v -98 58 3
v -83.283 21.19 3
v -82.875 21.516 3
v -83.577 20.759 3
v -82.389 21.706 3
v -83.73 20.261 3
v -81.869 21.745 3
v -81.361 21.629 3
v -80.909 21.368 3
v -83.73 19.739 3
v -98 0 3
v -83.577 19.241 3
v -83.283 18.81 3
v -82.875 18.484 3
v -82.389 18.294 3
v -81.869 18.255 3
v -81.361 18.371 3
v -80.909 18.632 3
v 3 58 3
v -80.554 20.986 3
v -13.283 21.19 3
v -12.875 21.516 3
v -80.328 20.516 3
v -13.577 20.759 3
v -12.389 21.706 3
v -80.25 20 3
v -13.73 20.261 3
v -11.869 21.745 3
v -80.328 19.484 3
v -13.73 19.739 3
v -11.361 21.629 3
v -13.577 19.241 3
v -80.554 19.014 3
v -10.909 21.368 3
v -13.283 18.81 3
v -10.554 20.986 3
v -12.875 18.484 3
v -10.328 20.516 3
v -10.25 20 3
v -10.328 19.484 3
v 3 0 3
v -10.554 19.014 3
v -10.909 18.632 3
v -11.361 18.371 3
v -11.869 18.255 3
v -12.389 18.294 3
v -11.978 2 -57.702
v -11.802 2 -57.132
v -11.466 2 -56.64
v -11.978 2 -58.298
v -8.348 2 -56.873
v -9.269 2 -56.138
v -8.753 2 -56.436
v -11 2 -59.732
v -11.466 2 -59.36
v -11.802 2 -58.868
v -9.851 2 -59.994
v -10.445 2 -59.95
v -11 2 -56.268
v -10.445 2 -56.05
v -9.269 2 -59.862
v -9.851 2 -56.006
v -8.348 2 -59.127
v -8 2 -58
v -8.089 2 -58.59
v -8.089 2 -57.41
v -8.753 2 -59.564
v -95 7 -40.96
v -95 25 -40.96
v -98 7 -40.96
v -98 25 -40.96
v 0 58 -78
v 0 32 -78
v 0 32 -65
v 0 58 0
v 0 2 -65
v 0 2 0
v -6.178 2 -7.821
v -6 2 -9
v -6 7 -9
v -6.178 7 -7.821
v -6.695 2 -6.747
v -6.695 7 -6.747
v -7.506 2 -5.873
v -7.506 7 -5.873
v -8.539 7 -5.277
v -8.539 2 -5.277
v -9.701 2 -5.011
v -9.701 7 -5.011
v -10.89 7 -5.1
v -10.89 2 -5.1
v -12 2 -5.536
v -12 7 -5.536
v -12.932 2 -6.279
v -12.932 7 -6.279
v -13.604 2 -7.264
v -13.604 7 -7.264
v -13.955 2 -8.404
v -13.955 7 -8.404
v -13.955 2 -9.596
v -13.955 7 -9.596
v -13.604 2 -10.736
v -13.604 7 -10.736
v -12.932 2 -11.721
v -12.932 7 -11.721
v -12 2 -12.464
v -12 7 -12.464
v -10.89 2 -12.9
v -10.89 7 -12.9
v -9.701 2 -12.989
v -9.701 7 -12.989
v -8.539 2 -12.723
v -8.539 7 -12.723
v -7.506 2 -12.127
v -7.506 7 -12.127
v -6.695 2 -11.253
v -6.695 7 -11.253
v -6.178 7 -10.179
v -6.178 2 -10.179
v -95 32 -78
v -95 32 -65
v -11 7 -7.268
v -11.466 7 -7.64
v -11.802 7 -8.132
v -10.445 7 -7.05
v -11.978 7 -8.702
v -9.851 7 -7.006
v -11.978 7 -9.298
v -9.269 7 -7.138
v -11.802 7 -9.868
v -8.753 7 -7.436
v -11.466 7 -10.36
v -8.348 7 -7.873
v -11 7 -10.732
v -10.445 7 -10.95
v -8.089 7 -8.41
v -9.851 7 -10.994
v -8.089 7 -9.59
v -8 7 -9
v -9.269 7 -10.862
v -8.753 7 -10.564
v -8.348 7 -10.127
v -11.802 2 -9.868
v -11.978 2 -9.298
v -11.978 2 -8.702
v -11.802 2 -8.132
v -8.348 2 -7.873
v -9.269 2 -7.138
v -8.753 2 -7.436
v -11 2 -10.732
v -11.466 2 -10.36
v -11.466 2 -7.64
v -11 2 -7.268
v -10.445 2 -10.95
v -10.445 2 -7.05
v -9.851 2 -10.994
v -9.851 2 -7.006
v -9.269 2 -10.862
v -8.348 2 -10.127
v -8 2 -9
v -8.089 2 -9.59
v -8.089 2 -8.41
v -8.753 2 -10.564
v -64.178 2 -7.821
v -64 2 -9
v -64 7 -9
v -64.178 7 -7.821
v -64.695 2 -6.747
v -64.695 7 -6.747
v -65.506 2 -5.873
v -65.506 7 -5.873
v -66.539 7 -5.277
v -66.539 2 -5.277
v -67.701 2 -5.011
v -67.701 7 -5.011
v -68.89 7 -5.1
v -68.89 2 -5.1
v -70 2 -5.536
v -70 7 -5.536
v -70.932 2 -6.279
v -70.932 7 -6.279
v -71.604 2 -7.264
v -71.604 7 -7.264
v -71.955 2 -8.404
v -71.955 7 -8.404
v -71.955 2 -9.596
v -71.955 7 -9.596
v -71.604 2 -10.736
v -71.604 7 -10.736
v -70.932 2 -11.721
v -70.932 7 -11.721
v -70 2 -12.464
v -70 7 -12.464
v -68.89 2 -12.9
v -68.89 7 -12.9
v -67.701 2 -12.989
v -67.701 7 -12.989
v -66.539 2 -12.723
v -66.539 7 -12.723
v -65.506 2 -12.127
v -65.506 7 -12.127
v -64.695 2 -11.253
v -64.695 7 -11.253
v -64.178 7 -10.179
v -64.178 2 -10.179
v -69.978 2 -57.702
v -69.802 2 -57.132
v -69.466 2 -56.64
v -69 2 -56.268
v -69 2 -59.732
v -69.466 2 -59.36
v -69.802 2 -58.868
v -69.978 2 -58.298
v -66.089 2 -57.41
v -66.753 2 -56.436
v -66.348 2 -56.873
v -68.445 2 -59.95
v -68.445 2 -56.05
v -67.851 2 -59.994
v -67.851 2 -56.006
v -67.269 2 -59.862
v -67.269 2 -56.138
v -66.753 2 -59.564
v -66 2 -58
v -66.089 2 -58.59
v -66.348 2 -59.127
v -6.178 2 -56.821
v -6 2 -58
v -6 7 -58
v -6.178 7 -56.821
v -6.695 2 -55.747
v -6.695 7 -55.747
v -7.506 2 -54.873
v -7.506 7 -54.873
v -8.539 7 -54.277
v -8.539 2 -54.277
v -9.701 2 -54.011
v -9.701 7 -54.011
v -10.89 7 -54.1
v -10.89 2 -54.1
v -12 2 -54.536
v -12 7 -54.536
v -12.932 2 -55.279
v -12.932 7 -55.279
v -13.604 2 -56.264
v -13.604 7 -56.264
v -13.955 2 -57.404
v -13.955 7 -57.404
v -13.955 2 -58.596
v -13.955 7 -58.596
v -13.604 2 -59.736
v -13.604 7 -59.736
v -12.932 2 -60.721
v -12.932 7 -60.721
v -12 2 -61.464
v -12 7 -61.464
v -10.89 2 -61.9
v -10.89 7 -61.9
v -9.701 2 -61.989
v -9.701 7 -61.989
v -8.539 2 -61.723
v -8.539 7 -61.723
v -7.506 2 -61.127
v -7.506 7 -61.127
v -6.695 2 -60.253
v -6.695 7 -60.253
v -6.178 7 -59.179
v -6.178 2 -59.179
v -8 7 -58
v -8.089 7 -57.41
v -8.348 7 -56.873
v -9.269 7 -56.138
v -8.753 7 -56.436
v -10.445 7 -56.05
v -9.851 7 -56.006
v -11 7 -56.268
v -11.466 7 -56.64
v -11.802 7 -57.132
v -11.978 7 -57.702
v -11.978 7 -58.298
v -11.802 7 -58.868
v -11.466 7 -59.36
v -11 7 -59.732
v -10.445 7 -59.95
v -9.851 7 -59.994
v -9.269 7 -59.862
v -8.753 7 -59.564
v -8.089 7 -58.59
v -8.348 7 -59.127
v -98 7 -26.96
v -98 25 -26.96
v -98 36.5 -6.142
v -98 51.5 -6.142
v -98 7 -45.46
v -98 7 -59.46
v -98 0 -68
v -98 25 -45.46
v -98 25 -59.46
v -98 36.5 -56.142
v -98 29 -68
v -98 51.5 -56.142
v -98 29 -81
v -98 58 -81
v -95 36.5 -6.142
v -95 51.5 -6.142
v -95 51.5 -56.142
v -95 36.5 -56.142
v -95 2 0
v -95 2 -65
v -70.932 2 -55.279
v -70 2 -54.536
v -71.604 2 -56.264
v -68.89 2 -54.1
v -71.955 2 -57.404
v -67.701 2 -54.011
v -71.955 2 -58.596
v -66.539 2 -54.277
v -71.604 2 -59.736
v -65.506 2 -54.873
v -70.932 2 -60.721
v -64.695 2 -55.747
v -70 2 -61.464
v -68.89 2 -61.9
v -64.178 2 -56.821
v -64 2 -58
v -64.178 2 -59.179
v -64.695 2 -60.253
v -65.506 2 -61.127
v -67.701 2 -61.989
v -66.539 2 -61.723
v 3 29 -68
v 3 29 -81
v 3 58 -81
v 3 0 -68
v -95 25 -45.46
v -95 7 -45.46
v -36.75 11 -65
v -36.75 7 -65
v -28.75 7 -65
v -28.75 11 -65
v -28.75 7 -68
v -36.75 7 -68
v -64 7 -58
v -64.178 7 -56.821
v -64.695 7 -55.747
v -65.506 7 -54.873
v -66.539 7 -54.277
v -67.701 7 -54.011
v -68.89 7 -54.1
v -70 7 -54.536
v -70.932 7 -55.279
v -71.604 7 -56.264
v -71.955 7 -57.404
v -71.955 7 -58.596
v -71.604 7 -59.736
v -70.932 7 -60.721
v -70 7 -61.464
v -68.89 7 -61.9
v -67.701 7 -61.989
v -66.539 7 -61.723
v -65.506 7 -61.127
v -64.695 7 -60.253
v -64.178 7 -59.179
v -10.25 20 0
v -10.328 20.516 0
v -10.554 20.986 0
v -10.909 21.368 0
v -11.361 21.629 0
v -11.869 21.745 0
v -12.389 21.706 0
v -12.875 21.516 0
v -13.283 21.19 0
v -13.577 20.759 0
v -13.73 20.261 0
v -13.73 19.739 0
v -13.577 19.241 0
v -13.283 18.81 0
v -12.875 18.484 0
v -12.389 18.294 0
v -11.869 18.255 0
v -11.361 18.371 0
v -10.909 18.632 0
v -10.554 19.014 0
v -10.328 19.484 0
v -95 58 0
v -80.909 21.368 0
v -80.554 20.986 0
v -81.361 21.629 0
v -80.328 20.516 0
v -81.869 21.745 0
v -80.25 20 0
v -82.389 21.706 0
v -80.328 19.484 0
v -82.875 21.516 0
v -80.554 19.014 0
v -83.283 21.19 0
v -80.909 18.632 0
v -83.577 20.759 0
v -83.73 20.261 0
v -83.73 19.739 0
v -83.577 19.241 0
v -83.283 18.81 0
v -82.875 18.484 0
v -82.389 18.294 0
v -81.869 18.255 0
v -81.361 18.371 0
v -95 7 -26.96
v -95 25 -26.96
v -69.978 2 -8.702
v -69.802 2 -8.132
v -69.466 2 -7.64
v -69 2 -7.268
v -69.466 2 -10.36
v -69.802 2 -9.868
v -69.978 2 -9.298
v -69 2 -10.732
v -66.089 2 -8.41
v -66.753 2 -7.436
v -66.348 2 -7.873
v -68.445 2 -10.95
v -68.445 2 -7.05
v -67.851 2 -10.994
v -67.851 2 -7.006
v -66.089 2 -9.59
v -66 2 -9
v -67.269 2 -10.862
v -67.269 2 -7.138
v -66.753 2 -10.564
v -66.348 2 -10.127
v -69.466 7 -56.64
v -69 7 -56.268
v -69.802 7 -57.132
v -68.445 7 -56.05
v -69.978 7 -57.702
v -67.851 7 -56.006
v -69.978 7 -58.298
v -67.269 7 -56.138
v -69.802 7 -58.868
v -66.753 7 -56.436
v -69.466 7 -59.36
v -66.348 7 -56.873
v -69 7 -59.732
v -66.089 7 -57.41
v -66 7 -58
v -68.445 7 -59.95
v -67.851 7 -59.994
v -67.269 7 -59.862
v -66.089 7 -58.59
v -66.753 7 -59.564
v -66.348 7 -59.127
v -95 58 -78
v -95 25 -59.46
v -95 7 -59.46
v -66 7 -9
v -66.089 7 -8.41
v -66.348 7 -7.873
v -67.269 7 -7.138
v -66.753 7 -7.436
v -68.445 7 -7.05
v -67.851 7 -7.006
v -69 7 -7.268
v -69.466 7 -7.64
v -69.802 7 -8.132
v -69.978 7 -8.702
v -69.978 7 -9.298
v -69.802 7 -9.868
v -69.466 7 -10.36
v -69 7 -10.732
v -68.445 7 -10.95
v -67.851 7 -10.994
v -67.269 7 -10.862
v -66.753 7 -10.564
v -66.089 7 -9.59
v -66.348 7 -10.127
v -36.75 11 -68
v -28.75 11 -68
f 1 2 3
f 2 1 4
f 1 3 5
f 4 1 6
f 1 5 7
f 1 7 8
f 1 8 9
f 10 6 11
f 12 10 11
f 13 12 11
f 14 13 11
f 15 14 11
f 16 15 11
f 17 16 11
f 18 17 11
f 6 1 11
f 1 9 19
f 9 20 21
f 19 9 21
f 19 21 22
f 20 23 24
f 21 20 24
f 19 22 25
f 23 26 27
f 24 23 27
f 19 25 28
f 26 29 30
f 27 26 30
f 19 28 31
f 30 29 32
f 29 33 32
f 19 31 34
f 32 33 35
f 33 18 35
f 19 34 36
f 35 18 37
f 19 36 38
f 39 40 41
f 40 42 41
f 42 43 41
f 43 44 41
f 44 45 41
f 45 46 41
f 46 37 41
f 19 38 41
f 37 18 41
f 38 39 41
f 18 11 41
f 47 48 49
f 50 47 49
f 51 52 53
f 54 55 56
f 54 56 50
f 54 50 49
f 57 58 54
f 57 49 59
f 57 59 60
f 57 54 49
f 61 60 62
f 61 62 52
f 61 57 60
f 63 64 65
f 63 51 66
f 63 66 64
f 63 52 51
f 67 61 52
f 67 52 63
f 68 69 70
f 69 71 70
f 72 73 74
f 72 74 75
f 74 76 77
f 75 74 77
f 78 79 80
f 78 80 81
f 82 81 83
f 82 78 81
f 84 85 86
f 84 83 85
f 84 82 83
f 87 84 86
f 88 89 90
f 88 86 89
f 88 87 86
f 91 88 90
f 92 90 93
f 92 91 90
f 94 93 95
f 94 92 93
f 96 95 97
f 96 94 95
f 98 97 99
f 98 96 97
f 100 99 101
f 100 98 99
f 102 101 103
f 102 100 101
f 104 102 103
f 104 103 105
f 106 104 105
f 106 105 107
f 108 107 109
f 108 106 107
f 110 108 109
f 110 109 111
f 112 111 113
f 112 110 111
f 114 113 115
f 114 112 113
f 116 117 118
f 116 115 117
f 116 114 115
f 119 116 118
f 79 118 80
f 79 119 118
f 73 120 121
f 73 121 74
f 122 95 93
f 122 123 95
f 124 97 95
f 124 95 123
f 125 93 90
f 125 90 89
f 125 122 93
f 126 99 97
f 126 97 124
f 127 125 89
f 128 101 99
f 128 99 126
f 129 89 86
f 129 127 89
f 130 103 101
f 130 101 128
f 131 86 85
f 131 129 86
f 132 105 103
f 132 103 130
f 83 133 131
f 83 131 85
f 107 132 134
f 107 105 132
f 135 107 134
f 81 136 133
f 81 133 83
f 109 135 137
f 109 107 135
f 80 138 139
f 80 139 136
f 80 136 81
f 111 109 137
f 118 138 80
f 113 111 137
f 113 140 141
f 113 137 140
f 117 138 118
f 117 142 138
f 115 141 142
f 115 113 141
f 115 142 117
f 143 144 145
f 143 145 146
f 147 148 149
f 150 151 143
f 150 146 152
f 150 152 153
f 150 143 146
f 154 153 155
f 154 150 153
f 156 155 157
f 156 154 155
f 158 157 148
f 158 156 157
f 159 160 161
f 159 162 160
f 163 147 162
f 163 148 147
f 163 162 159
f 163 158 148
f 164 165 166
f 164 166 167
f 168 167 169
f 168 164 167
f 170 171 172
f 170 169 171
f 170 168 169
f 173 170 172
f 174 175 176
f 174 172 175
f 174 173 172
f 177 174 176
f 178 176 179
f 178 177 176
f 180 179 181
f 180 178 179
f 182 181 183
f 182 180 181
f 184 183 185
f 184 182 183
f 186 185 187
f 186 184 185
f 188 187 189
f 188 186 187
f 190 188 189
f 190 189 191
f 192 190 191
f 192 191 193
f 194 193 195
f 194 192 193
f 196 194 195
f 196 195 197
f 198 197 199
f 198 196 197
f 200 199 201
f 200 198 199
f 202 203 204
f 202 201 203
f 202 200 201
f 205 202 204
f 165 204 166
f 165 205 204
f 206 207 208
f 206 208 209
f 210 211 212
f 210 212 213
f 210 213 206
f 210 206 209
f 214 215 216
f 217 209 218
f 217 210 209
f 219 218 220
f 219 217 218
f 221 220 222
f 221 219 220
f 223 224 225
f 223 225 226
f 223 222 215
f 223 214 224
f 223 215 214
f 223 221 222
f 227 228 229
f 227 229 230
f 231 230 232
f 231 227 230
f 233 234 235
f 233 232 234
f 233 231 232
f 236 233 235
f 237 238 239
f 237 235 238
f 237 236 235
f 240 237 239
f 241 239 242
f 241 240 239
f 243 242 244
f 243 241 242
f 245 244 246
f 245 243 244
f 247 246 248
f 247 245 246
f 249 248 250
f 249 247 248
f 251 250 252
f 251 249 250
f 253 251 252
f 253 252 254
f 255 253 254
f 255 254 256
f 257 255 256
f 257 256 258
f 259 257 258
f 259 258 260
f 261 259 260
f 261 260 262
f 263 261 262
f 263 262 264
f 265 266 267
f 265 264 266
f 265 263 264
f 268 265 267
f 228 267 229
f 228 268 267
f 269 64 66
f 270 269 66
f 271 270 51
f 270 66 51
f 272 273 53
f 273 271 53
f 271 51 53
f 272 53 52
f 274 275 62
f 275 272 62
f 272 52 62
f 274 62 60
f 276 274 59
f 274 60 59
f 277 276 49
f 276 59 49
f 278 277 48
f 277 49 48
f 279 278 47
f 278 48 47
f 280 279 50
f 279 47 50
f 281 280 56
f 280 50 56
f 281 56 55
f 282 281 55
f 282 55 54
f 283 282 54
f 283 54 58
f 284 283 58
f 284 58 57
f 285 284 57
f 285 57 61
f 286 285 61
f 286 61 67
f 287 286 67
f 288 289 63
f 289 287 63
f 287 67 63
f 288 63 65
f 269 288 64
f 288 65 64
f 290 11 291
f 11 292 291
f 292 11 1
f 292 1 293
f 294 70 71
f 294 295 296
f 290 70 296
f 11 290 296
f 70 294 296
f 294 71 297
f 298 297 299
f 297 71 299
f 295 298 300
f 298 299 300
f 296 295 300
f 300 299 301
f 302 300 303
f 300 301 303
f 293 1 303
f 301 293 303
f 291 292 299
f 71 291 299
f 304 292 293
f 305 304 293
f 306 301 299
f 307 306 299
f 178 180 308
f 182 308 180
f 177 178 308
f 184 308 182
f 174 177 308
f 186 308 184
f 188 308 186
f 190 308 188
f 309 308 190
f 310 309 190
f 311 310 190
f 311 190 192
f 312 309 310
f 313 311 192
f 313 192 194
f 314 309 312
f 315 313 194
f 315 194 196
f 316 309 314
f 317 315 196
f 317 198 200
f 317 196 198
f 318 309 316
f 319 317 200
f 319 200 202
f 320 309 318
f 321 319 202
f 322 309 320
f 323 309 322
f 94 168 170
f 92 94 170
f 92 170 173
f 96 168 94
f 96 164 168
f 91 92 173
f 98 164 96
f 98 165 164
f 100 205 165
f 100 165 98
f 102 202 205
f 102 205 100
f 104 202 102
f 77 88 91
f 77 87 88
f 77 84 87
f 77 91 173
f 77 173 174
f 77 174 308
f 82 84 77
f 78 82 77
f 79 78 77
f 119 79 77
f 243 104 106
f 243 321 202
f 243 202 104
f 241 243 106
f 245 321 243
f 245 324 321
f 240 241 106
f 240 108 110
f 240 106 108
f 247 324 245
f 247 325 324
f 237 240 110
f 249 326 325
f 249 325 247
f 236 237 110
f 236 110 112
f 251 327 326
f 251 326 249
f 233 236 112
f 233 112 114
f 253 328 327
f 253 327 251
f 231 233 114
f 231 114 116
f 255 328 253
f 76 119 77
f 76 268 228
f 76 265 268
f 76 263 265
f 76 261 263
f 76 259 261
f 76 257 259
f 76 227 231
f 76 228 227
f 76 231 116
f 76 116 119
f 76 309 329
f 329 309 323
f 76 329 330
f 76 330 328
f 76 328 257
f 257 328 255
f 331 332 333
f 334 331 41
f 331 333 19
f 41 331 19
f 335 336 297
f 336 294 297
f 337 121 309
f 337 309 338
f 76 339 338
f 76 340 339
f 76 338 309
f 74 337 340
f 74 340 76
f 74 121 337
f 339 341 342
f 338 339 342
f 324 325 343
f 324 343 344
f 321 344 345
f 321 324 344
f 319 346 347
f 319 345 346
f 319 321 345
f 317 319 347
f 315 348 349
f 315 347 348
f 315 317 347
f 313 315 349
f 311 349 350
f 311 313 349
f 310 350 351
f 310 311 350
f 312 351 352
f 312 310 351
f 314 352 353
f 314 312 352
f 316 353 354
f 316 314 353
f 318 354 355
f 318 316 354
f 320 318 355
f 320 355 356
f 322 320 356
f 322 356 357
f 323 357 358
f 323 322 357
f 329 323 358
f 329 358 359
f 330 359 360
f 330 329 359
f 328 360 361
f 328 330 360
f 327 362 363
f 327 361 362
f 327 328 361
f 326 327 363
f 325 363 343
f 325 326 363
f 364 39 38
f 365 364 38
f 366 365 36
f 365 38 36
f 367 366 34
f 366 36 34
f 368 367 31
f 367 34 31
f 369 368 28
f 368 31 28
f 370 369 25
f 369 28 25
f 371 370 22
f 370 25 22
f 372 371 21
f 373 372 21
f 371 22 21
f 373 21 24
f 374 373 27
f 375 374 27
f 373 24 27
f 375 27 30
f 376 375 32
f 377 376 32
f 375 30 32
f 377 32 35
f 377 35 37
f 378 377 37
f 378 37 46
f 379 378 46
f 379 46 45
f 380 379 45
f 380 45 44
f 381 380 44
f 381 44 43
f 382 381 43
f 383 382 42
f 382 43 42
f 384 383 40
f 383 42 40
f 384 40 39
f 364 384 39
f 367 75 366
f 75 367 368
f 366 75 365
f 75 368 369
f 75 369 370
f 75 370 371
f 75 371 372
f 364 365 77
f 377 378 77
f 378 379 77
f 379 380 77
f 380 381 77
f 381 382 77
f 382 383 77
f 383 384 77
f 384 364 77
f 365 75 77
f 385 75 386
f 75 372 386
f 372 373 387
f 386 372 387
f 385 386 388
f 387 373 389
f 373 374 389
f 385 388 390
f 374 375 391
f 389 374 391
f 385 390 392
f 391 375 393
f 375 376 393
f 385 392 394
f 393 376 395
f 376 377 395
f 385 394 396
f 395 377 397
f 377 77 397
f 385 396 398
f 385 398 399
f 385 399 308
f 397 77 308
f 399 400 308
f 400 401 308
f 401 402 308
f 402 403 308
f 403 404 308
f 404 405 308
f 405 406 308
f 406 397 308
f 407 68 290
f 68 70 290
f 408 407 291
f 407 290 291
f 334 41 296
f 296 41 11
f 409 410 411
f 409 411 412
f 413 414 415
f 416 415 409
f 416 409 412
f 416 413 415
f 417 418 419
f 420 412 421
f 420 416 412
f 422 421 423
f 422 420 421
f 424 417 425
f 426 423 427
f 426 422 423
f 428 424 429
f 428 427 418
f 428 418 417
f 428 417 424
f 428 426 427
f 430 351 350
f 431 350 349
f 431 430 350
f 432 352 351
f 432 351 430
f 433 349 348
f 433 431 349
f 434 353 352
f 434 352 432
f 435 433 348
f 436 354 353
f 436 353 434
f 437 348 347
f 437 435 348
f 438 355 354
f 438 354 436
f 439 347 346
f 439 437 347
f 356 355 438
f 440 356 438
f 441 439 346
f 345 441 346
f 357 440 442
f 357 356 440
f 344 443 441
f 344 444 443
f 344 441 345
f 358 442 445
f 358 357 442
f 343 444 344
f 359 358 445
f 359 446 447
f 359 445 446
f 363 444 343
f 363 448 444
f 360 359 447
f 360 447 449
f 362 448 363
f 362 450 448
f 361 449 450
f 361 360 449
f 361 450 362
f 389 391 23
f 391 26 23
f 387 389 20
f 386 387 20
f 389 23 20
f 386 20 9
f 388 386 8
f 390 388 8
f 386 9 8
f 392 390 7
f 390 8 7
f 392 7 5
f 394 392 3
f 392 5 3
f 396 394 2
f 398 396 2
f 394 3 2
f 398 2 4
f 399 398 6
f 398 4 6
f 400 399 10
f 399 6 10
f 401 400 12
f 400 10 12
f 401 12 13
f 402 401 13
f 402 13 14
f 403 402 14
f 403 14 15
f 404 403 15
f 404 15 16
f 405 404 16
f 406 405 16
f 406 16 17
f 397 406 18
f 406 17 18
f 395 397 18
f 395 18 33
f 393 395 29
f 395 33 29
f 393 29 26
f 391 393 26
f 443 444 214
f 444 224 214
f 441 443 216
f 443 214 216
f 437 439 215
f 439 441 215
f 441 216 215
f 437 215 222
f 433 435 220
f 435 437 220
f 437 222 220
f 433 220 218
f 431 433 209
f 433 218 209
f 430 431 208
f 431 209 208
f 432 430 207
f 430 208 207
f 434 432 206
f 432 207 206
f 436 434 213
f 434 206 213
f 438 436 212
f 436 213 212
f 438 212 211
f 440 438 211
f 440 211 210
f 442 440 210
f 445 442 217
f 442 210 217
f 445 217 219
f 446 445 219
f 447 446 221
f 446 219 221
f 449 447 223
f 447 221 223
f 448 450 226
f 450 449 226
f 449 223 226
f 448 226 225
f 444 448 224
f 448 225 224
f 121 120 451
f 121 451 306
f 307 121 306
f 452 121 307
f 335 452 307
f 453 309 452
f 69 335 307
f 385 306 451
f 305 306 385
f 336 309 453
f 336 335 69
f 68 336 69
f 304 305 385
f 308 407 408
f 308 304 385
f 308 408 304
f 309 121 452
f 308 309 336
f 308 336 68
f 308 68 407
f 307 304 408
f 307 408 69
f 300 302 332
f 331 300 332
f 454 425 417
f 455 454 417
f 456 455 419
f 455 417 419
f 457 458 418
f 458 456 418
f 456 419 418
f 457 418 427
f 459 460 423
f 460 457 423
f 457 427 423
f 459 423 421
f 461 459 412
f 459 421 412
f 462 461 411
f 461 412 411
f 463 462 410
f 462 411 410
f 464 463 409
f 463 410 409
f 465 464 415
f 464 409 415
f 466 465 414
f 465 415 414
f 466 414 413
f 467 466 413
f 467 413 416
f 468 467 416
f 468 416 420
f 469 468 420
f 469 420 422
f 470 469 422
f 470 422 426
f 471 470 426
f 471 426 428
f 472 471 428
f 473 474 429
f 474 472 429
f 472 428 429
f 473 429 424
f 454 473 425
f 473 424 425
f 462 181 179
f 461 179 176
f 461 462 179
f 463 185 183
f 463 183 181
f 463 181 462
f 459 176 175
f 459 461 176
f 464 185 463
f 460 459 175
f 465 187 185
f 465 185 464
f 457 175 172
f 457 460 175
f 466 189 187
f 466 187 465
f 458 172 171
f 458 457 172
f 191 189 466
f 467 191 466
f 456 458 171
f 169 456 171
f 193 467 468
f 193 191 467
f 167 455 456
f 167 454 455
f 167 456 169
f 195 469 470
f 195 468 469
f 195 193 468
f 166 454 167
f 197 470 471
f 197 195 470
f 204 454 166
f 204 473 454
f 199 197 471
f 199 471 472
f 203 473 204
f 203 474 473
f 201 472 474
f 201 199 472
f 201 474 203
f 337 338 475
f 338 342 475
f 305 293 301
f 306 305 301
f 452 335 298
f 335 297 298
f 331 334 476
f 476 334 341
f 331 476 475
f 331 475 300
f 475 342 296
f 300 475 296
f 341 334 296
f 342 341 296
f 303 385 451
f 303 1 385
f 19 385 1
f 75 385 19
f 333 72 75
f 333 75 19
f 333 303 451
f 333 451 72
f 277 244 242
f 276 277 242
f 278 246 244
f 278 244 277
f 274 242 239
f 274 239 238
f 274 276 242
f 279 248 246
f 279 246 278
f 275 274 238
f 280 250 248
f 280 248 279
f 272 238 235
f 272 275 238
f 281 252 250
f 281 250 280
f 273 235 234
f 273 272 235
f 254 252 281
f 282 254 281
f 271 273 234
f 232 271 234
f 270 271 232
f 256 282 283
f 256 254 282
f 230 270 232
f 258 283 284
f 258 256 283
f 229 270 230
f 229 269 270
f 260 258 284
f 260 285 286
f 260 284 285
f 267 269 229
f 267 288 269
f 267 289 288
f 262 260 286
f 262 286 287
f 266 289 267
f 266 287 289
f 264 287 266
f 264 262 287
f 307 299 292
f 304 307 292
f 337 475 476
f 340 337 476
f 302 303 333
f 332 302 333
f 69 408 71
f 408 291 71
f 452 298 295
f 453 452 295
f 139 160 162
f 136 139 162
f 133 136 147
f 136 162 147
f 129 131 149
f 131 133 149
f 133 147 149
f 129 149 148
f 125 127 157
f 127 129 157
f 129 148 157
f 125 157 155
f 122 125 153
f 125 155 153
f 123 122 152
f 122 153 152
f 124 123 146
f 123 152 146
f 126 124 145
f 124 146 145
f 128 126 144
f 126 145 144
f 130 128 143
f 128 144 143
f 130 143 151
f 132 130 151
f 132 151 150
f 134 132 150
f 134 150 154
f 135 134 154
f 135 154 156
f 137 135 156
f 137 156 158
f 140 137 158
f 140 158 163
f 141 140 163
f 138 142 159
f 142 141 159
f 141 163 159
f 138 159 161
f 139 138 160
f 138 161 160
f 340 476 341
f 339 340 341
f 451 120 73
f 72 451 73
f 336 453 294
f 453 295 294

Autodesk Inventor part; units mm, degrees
ref_plane "YZ Plane" through (0, 0, 0) normal (1, 0, 0) x (0, 1, 0)
ref_plane "XZ Plane" through (0, 0, 0) normal (0, 1, 0) x (-1, 0, 0)
ref_plane "XY Plane" through (0, 0, 0) normal (0, 0, 1) x (1, 0, 0)
sketch "Sketch1" plane through (0, 0, 0) normal (0, 1, 0) x (-1, 0, 0)
  line L0 (0, 0) -> (95, 0)
  line L1 (95, 0) -> (95, -65)
  line L2 (95, -65) -> (0, -65)
  line L3 (0, -65) -> (0, 0)
  line L4 (98, -68) -> (98, 3)
  line L5 (98, 3) -> (-3, 3)
  line L6 (-3, 3) -> (-3, -68)
  line L7 (-3, -68) -> (98, -68)
  dimension "d0" = 95
  dimension "d1" = 65
  dimension "d2" = 3
extrude "Extrusion1" add sketch "Sketch1" along normal blind 32 contours L0 L1 L2 L3 | L7 L6 L5 L4
sketch "Sketch2" plane through (0, 32, 0) normal (0, 1, 0) x (1, 0, 0)
  line L0 (0, 0) -> (-95, 0)
  line L1 (-95, 0) -> (-95, 65)
  line L2 (-95, 65) -> (0, 65)
  line L3 (0, 65) -> (0, 0)
  dimension "d5" = 95
  dimension "d6" = 65
extrude "Extrusion2" cut sketch "Sketch2" against normal blind 30
sketch "Sketch3" plane through (0, 2, 0) normal (0, 1, 0) x (1, 0, 0)
  line L0 (0, 65) -> (0, 0) projected
  line L1 (0, 0) -> (0, 9)
  line L2 (0, 9) -> (-10, 9)
  circle A0 centre (-10, 9) radius 2
  circle A1 centre (-10, 9) radius 4
  circle A2 centre (-10, 58) radius 4
  circle A3 centre (-10, 58) radius 2
  circle A4 centre (-68, 9) radius 4
  circle A5 centre (-68, 9) radius 2
  circle A6 centre (-68, 58) radius 4
  circle A7 centre (-68, 58) radius 2
  dimension "d9" = 9
  dimension "d10" = 10
  dimension "d11" = 4
  dimension "d12" = 8
  dimension "d15" = 49
  dimension "d18" = 58
extrude "Extrusion3" add sketch "Sketch3" along normal blind 5
sketch "Sketch4" plane through (0, 32, 0) normal (0, 1, 0) x (1, 0, 0)
  line L0 (3, 68) -> (-98, 68) projected
  line L1 (3, 68) -> (-98, 68)
  line L2 (-98, 68) -> (-98, 81)
  line L3 (-98, 81) -> (3, 81)
  line L4 (3, 81) -> (3, 68)
  point P0 (0, 0)
  dimension "d23" = 13
  dimension "d62" = 101
extrude "Extrusion4" add sketch "Sketch4" against normal blind 3
sketch "Sketch5" plane through (0, 32, 0) normal (0, 1, 0) x (1, 0, 0)
  line L0 (-98, 81) -> (3, 81) projected
  line L1 (3, 81) -> (-97, 81)
  line L2 (-97, 81) -> (-97, 78)
  line L3 (-97, 78) -> (3, 78)
  line L4 (3, 78) -> (3, 81)
  line L5 (3, 81) -> (0, 81)
  line L6 (0, 81) -> (0, -3)
  line L7 (0, -3) -> (3, -3)
  line L8 (3, -3) -> (3, 81)
  line L9 (-98, 68) -> (-98, 81) projected
  line L10 (-98, 81) -> (-95, 81)
  line L11 (-95, 81) -> (-95, -3)
  line L12 (-95, -3) -> (-98, -3)
  line L13 (-98, -3) -> (-98, 81)
  line L14 (-98, -3) -> (2, -3)
  line L15 (2, -3) -> (2, 0)
  line L16 (2, 0) -> (-98, 0)
  line L17 (-98, 0) -> (-98, -3)
  point P0 (0, 0)
  dimension "d26" = 100
  dimension "d27" = 3
  dimension "d28" = 3
  dimension "d29" = 84
  dimension "d30" = 3
  dimension "d31" = 84
  dimension "d32" = 100
  dimension "d33" = 3
extrude "Extrusion5" add sketch "Sketch5" along normal blind 26 contours L0 L2 L3 L11 L16 L13 L9 | L0 L11 L3 L2 | L0 L6 L3 L11 | L16 L11 L12 L13 | L0 L4 L3 L6 | L16 L6 L14 L11 | L3 L8 L7 L15 L16 L6 | L16 L15 L7 L6
sketch "Sketch6" plane through (-98, 0, -68) normal (-1, 0, 0) x (0, 0, 1)
  line L0 (71, 0) -> (71, 32) projected
  line L1 (71, 58) -> (61.858, 58)
  line L2 (71, 58) -> (-13, 58) projected
  line L3 (61.858, 58) -> (61.858, 51.5)
  line L4 (61.858, 51.5) -> (11.858, 51.5)
  line L5 (11.858, 51.5) -> (11.858, 36.5)
  line L6 (11.858, 36.5) -> (61.858, 36.5)
  line L7 (61.858, 36.5) -> (61.858, 51.5)
  line L8 (3, 32) -> (3, 2) projected
  line L9 (3, 2) -> (3, 7)
  line L10 (68, 2) -> (3, 2) projected
  line L11 (3, 2) -> (8, 2) construction
  line L12 (3, 7) -> (8.54, 7)
  line L13 (8.54, 7) -> (22.54, 7)
  line L14 (22.54, 7) -> (22.54, 25)
  line L15 (22.54, 25) -> (8.54, 25)
  line L16 (8.54, 25) -> (8.54, 7)
  line L17 (22.54, 7) -> (27.04, 7)
  line L18 (27.04, 7) -> (41.04, 7)
  line L19 (41.04, 7) -> (41.04, 25)
  line L20 (41.04, 25) -> (27.04, 25)
  line L21 (27.04, 25) -> (27.04, 7)
  point P0 (68, 0)
  dimension "d36" = 9.142
  dimension "d37" = 6.5
  dimension "d38" = 50
  dimension "d39" = 15
  dimension "d40" = 5
  dimension "d41" = 90
  dimension "d42" = 5.54
  dimension "d43" = 14
  dimension "d44" = 18
  dimension "d45" = 4.5
  dimension "d46" = 14
  dimension "d47" = 18
extrude "Extrusion6" cut sketch "Sketch6" against normal blind 3
sketch "Sketch7" plane through (3, 0, -68) normal (0, 0, -1) x (-1, 0, 0)
  line L0 (3, 2) -> (3, 32) projected
  line L1 (3, 2) -> (4, 2)
  line L2 (4, 2) -> (4, 7)
  line L3 (4, 7) -> (31.75, 7)
  line L4 (31.75, 7) -> (39.75, 7)
  line L5 (39.75, 7) -> (39.75, 11)
  line L6 (39.75, 11) -> (31.75, 11)
  line L7 (31.75, 11) -> (31.75, 7)
  point P0 (3, 0)
  point P1 (3, 58)
  dimension "d50" = 1
  dimension "d51" = 5
  dimension "d52" = 27.75
  dimension "d53" = 8
  dimension "d54" = 4
extrude "Extrusion7" cut sketch "Sketch7" against normal blind 3
sketch "Sketch8" plane through (-98, 0, 3) normal (0, 0, 1) x (1, 0, 0)
  line L0 (101, 0) -> (101, 29) projected
  line L1 (101, 0) -> (101, 20)
  line L2 (101, 20) -> (86, 20)
  line L3 (86, 20) -> (16, 20)
  circle A0 centre (86, 20) radius 1.75
  circle A1 centre (16, 20) radius 1.75
  point P0 (98, 0)
  dimension "d63" = 20
  dimension "d64" = 15
  dimension "d65" = 70
  dimension "d66" = 3.5
  dimension "d67" = 3.5
extrude "Extrusion8" cut sketch "Sketch8" against normal blind 10
properties part number "MainPCB_RPI_Case"
